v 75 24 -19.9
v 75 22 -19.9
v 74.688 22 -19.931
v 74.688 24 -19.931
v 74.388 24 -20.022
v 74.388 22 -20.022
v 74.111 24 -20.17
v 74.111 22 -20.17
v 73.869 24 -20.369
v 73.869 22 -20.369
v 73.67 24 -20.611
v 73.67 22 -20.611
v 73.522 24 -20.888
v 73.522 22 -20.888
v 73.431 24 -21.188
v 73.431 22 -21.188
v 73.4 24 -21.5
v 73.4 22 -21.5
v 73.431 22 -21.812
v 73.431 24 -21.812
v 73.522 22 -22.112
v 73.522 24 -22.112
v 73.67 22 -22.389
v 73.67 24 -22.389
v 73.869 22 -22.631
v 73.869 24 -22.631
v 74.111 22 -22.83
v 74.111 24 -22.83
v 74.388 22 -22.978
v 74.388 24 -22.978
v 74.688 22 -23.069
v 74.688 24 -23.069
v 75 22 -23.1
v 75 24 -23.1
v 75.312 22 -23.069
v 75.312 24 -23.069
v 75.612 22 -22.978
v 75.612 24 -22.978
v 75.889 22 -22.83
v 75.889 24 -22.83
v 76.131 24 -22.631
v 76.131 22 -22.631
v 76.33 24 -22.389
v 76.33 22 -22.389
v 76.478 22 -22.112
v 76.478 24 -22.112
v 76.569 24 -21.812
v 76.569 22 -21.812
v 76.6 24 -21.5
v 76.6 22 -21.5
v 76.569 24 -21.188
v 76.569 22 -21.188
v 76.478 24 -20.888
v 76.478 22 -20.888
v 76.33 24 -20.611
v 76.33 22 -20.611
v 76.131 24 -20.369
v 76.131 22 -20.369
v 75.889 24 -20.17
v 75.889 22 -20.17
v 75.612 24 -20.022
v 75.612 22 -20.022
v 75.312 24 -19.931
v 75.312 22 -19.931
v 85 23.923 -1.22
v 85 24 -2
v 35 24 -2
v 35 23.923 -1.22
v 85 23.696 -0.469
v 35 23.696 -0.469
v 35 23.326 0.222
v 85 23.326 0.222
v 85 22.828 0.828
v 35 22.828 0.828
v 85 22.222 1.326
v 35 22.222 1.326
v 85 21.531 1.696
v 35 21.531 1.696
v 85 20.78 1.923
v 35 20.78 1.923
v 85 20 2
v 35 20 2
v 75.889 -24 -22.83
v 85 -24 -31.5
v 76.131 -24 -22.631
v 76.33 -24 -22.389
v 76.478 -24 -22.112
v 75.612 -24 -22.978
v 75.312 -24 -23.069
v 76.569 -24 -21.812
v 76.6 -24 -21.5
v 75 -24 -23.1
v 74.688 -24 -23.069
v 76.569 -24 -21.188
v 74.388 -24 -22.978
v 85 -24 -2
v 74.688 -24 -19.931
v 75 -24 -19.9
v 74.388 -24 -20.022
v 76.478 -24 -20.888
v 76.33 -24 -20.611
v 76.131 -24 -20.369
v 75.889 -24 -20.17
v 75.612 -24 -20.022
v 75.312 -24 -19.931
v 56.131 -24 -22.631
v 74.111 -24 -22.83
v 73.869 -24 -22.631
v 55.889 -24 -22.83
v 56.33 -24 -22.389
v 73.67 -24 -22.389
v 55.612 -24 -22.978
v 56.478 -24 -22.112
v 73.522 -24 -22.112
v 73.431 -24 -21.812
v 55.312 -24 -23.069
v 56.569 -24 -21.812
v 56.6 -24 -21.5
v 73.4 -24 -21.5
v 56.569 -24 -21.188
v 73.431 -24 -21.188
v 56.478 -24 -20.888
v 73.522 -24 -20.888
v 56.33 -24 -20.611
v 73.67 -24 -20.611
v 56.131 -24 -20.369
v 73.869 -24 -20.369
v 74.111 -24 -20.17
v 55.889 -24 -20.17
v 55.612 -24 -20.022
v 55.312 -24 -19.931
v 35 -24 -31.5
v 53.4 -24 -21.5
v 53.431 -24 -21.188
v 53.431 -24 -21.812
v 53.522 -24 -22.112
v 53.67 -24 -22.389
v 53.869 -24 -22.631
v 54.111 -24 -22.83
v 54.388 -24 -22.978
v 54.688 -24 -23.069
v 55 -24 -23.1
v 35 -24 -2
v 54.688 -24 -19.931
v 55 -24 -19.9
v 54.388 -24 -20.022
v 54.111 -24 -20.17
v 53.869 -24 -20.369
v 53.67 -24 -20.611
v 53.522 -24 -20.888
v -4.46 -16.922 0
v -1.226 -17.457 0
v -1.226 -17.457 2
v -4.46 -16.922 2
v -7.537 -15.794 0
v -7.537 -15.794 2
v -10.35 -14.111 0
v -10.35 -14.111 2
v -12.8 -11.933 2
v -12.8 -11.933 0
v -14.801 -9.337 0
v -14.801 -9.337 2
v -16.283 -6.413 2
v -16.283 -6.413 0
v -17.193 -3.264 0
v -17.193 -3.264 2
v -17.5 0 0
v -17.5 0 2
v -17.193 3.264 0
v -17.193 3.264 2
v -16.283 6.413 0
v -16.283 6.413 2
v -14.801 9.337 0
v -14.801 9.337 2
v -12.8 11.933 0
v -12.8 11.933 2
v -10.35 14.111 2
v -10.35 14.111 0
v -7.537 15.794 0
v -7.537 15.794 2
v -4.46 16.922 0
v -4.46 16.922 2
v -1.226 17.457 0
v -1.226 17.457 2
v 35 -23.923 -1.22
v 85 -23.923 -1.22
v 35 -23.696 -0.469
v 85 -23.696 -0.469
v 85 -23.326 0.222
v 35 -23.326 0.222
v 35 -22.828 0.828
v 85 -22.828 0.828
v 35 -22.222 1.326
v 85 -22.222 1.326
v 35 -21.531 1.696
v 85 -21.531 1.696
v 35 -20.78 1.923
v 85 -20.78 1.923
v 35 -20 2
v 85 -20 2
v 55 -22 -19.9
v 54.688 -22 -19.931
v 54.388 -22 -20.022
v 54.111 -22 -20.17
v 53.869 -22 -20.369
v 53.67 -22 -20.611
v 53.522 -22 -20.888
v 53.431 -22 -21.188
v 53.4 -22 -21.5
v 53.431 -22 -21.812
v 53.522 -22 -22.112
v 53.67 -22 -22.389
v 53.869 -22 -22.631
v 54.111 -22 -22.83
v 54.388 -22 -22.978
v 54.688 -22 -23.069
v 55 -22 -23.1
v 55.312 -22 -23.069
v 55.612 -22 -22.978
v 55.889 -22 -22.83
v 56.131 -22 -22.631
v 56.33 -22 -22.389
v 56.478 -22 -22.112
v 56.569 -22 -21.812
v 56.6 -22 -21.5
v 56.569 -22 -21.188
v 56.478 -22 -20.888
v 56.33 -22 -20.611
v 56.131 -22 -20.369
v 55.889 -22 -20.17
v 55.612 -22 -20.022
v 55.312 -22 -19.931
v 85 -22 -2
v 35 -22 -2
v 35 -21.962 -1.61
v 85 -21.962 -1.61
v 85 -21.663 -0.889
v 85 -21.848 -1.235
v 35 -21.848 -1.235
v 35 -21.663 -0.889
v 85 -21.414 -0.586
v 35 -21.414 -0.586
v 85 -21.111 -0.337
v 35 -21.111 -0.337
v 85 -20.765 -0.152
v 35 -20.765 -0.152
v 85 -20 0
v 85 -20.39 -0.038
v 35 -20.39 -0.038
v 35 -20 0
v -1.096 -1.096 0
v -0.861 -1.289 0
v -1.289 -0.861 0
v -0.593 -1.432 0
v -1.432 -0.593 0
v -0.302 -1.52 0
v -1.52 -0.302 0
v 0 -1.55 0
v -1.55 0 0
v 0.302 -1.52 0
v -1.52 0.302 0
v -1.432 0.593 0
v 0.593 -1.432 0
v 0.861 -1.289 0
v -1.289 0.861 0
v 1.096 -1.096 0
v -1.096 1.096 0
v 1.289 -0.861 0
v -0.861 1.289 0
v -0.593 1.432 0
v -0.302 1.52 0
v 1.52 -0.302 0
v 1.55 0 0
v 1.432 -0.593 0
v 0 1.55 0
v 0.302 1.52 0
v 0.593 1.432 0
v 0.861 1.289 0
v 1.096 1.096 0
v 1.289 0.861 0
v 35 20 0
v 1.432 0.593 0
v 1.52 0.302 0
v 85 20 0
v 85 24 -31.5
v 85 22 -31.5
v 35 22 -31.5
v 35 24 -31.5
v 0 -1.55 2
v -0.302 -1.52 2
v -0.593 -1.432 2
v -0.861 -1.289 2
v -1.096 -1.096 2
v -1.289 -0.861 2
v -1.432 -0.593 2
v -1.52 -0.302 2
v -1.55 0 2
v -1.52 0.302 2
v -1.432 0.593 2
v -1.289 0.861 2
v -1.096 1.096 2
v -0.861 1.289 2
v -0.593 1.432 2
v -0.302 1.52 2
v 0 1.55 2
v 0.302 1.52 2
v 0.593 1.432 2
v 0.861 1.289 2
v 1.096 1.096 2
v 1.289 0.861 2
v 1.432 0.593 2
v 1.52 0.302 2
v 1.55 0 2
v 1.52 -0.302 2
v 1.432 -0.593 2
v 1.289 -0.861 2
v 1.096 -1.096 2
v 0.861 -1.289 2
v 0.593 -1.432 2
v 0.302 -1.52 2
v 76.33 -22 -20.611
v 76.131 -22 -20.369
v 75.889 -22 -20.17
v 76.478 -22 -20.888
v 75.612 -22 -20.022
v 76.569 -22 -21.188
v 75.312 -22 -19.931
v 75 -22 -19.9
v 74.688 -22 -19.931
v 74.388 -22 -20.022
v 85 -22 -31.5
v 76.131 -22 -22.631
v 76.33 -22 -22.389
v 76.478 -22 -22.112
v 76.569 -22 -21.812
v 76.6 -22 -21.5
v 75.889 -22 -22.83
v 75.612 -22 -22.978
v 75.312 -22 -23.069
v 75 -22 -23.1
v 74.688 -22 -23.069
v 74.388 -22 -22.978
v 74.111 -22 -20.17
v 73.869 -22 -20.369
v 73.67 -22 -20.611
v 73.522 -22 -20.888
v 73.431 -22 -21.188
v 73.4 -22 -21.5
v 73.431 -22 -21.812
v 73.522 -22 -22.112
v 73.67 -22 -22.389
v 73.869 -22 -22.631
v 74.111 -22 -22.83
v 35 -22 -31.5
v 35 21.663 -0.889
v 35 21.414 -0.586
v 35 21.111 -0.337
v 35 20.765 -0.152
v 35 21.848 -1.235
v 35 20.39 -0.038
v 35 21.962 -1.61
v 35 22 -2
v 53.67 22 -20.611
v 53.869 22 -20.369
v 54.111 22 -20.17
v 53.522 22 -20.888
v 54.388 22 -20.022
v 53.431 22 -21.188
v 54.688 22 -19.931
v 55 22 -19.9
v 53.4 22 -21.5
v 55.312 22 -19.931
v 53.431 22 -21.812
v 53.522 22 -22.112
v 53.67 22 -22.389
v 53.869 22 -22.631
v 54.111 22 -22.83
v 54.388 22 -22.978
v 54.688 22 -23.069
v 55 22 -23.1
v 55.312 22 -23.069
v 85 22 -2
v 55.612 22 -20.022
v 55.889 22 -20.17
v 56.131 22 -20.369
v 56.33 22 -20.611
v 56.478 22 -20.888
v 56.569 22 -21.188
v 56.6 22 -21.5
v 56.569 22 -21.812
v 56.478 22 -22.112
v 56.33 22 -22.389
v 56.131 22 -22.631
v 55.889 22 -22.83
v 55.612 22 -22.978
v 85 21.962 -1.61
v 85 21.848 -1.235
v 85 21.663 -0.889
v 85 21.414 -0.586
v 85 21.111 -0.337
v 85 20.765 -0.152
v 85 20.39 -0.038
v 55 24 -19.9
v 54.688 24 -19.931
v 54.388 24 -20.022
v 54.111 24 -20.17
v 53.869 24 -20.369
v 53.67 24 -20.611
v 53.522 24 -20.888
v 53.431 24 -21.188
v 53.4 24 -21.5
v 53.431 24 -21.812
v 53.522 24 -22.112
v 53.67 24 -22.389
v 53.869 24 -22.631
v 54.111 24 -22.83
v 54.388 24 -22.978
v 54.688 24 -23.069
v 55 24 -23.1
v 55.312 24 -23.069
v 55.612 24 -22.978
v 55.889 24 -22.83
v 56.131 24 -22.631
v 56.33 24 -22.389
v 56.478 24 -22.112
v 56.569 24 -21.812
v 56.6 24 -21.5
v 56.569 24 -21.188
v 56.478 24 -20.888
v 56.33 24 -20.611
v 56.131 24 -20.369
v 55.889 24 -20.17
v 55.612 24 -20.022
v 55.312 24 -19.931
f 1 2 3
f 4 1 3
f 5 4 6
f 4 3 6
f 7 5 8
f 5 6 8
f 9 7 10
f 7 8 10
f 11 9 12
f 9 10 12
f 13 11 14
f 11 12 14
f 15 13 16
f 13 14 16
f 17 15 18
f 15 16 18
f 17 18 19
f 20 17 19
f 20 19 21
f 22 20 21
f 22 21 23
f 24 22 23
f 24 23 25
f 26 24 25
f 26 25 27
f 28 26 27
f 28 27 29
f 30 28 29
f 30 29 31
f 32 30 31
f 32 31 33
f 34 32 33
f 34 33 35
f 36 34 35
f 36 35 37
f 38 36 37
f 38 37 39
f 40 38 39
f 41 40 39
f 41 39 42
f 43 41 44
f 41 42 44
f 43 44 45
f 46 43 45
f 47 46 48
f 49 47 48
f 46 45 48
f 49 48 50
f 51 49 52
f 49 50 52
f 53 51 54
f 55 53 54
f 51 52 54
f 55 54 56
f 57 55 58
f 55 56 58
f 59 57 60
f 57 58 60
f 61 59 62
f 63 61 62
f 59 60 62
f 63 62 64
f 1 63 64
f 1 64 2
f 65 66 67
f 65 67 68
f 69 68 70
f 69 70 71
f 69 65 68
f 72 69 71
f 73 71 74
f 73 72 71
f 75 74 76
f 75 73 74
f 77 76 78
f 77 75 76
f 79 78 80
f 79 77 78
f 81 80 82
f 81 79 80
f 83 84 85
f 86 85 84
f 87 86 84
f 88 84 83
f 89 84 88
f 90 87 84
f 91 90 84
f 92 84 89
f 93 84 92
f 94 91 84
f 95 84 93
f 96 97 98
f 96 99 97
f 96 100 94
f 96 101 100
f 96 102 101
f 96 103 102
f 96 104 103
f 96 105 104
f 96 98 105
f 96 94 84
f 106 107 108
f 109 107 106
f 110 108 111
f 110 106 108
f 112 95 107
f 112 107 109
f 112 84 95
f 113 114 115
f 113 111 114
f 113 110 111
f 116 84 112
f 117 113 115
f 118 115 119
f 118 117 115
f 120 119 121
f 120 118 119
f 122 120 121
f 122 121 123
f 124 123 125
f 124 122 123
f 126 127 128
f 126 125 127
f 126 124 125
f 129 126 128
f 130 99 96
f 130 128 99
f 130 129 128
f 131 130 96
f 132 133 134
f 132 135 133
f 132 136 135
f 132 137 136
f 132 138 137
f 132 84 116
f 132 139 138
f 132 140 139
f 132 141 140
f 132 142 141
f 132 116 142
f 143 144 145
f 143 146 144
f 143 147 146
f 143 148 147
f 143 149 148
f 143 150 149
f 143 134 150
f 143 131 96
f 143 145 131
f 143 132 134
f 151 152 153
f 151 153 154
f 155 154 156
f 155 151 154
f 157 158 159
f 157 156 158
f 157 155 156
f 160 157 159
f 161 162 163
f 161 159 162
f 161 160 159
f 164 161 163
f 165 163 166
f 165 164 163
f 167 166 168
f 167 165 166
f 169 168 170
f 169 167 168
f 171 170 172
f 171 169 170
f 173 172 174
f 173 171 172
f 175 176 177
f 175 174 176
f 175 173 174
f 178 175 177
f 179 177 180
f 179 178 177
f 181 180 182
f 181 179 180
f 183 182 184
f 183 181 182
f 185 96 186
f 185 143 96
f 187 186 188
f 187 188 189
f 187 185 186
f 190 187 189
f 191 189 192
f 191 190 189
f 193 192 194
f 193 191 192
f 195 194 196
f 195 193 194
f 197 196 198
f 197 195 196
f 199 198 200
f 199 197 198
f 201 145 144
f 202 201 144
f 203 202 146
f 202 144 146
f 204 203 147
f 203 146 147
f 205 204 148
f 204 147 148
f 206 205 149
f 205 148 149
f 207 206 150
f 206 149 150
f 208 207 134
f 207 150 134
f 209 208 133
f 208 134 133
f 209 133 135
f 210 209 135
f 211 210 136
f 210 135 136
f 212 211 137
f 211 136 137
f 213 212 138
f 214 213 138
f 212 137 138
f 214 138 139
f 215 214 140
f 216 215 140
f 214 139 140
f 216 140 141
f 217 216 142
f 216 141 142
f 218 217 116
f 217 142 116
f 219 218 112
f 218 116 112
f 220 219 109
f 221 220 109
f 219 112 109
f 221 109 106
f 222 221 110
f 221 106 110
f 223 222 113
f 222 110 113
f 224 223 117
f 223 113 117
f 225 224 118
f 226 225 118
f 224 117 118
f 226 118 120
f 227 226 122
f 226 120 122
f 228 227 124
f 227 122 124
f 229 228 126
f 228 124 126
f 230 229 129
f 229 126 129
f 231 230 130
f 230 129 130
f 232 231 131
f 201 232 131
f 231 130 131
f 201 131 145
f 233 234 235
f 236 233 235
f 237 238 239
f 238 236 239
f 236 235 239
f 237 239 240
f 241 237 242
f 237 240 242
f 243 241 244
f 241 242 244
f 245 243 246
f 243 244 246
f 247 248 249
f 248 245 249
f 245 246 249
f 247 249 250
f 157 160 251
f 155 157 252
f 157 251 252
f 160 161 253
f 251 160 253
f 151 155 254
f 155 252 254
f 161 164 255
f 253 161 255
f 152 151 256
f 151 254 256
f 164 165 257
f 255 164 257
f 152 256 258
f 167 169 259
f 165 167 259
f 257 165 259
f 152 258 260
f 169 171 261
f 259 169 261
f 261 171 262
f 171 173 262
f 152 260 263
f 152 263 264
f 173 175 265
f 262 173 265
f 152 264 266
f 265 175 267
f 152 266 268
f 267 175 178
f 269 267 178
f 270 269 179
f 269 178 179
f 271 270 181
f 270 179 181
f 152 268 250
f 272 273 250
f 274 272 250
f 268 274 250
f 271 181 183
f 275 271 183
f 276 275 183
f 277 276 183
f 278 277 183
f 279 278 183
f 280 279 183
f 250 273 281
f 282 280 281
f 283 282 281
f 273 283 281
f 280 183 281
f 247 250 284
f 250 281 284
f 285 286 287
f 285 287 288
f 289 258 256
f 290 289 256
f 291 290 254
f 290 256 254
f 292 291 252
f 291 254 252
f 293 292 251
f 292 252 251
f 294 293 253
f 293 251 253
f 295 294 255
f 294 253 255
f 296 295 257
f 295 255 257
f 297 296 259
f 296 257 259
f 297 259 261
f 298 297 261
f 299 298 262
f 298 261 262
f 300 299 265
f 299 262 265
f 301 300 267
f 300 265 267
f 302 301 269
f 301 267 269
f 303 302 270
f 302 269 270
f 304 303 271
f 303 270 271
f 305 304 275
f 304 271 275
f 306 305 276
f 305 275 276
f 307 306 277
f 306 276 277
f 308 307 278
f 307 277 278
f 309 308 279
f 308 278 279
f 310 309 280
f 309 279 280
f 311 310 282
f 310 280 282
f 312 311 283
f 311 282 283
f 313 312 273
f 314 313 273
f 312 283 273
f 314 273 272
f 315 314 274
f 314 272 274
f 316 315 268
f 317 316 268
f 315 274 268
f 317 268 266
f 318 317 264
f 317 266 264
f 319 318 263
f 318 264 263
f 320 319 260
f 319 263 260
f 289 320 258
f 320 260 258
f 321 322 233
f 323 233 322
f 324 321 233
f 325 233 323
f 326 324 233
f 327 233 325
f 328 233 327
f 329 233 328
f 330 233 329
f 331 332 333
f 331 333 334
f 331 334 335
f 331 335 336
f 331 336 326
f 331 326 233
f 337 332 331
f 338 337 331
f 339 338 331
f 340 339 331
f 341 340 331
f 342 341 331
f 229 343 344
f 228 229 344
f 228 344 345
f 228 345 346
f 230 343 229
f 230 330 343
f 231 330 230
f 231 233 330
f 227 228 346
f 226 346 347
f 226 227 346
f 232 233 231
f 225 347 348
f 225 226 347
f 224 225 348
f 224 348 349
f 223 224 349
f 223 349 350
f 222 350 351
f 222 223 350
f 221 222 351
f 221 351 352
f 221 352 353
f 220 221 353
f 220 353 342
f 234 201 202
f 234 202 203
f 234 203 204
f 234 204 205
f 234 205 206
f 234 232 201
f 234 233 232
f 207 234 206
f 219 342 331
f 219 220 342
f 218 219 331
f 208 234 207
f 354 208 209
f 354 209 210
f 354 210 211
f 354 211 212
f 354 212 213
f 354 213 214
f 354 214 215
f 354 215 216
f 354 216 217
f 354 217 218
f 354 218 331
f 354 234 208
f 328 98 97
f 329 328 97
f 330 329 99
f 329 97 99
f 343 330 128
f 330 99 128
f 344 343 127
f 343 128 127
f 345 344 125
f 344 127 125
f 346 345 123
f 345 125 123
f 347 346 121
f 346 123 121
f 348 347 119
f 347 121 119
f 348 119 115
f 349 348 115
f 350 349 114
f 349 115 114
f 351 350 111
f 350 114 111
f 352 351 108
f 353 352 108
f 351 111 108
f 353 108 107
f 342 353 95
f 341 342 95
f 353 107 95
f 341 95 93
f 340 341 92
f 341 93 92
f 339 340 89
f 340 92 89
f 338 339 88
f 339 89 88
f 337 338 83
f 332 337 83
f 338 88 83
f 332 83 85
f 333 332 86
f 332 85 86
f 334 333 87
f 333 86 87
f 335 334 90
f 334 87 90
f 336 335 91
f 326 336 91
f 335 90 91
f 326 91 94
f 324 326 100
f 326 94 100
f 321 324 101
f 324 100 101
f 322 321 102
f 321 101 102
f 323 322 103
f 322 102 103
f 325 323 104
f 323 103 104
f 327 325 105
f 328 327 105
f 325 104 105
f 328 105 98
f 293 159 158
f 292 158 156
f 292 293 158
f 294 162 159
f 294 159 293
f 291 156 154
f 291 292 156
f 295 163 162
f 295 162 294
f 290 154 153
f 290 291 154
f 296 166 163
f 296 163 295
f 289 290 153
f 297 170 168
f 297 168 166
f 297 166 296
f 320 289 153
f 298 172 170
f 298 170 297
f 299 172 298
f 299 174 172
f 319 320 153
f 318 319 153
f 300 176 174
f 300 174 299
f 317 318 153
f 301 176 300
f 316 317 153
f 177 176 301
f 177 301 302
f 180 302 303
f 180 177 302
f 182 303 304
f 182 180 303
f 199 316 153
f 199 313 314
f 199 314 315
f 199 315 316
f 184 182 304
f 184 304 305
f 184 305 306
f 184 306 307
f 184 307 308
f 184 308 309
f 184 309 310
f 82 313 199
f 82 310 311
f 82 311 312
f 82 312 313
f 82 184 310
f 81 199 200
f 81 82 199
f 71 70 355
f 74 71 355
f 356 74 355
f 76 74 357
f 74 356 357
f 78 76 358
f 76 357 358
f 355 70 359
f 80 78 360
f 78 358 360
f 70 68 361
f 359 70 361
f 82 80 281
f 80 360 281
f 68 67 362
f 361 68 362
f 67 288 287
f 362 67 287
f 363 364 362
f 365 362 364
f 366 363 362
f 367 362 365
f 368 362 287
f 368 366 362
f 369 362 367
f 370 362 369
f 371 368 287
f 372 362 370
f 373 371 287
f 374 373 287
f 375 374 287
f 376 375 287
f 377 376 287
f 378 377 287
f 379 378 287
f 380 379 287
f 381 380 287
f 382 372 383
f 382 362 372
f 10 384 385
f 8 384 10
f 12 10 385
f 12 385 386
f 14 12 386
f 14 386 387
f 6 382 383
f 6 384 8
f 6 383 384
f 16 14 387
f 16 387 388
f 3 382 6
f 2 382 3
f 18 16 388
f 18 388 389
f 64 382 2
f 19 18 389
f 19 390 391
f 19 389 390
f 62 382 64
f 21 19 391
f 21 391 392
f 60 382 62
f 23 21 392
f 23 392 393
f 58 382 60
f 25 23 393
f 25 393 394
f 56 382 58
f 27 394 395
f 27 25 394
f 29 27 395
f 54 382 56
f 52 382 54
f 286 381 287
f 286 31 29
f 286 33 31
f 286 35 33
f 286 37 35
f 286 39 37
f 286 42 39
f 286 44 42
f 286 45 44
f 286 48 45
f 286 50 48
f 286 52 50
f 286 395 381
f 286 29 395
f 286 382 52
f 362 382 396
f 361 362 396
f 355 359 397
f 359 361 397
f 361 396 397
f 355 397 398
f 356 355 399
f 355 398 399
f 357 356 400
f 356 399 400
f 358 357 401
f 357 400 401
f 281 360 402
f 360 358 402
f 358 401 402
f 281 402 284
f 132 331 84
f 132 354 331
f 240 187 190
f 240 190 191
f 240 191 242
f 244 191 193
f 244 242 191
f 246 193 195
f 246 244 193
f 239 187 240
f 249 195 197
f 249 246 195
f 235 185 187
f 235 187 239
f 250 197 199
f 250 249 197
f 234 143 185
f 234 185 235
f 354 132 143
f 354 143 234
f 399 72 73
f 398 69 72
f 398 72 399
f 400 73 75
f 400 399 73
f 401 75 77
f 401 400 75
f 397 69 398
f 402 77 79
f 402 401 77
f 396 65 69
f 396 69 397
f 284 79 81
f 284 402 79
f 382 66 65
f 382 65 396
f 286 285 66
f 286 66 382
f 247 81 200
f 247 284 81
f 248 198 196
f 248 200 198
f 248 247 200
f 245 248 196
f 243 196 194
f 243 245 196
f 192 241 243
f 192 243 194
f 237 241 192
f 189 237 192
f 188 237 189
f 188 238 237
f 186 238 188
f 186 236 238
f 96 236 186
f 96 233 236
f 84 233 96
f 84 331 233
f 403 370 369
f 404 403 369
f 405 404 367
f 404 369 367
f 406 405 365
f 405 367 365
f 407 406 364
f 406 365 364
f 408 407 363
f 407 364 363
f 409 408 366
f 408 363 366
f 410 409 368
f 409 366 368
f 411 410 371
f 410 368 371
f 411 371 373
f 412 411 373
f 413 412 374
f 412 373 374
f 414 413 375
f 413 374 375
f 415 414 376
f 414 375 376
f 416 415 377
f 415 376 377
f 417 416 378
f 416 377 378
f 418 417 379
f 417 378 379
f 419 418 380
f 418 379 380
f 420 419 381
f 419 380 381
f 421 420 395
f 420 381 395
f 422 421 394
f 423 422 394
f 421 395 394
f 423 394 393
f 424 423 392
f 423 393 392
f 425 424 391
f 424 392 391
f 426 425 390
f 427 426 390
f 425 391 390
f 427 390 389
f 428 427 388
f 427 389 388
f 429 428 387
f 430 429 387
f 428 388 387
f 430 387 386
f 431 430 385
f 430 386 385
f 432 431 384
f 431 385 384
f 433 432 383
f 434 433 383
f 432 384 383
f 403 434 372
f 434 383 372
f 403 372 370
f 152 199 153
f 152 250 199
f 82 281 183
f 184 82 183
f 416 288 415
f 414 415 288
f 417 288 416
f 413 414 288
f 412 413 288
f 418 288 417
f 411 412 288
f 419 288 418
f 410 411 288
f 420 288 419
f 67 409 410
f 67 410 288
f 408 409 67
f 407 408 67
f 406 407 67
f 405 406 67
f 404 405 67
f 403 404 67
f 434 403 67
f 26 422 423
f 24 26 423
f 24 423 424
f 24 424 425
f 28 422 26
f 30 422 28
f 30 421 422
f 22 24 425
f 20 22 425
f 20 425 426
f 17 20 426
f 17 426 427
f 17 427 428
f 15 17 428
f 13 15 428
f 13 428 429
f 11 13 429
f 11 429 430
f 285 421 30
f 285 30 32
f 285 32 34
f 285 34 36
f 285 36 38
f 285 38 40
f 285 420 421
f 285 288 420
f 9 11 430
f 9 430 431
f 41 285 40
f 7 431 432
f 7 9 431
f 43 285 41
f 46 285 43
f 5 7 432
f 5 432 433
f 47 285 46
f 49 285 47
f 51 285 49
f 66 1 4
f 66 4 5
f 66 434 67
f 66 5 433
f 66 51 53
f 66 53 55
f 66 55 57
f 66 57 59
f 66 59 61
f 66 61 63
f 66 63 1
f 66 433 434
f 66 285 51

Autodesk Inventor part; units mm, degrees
ref_plane "YZ Plane" through (0, 0, 0) normal (1, 0, 0) x (0, 1, 0)
ref_plane "XZ Plane" through (0, 0, 0) normal (0, 1, 0) x (-1, 0, 0)
ref_plane "XY Plane" through (0, 0, 0) normal (0, 0, 1) x (1, 0, 0)
sketch "スケッチ1" plane through (0, 0, 0) normal (0, 0, 1) x (1, 0, 0)
  circle A0 centre (0, 0) radius 17.5
  line L0 (0, 0) -> (35, 0)
  line L1 (35, 0) -> (35, 20)
  line L2 (35, 20) -> (-1.2255, 17.457)
  line L3 (35, 20) -> (85, 20)
  line L4 (85, 20) -> (85, 0)
  line L5 (85, 0) -> (35, 0)
  line L6 (35, 0) -> (35, 20)
  line L7 (35, 0) -> (35, -20)
  line L8 (35, -20) -> (-1.2255, -17.457)
  line L9 (35, -20) -> (85, -20)
  line L10 (85, -20) -> (85, 0)
  point P0 (-1.2255, -17.457)
  dimension "d0" = 35
  dimension "d1" = 35
  dimension "d2" = 20
  dimension "d3" = 20
  dimension "d4" = 50
extrude "プレート1" add sketch "スケッチ1" along normal blind 2
sketch "スケッチ2" plane through (85, 22, -2) normal (0, 1, 0) x (-1, 0, 0)
  line L0 (50, 0) -> (0, 0)
  line L1 (0, 0) -> (0, -29.5)
  line L2 (0, -29.5) -> (50, -29.5)
  line L3 (50, -29.5) -> (50, 0)
edge flange "フランジ1" height 33.5 angle 90 thickness 2 bend radius 2 thickness toward (0, 1, 0) relief tear relief width 2 relief depth 1 corner gap 2 corner form 0 edges at (60, 20, 0) (60, -20, 0) wall of the first edge with corners at (35, 22, -2) (85, 22, -2) (85, 22, -31.5) (35, 22, -31.5)
bend "曲げ1"
corner "コーナー1"
sketch "スケッチ3" plane through (0, 0, 2) normal (0, 0, 1) x (1, 0, 0)
  circle A0 centre (0, 0) radius 12
  point P0 (0, 12)
  point P1 (-10.3923, 6)
  point P2 (-10.3923, -6)
  point P3 (0, -12)
  point P4 (10.3923, -6)
  point P5 (10.3923, 6)
  dimension "d16" = 24
  dimension "d19" = 360
hole "穴1" [suppressed]
sketch "スケッチ4" plane through (0, 0, 2) normal (0, 0, 1) x (1, 0, 0)
  arc A0 (-1.2255, 17.457) -> (-1.2255, -17.457) centre (0, 0) ccw projected
  circle A1 centre (0, 0) radius 6.25
  dimension "d28" = 12.5
extrude "押し出し1" [suppressed]
sketch "スケッチ5" plane through (35, 24, -31.5) normal (0, 1, 0) x (1, 0, 0)
  line L0 (0, 0) -> (0, -29.5) projected
  line L1 (0, -10) -> (50, -10)
  line L2 (50, -29.5) -> (50, 0) projected
  line L3 (50, 0) -> (0, 0) projected
  line L4 (10, 0) -> (10, -29.5)
  line L5 (0, -29.5) -> (50, -29.5) projected
  point P0 (-35, -31.5)
  point P1 (20, -10)
  point P2 (40, -10)
  dimension "d31" = 10
  dimension "d32" = 10
  dimension "d33" = 10
  dimension "d34" = 20
hole "穴2" at (55, 24, -21.5) at (75, 24, -21.5) direction (0, -1, 0) diameter 3.2 end through all
sketch "スケッチ6" plane through (0, 0, 2) normal (0, 0, 1) x (1, 0, 0)
  point P0 (0, 0)
  point P1 (0, 0)
hole "穴3" at (0, 0, 2) direction (0, 0, -1) diameter 3.1 end through all
equation "\"d26\" = Thickness"
equation "\"d47\" = Thickness"
equation "\"d5\" = Thickness"
equation "\"d6\" = BendReliefWidth"
equation "\"d7\" = BendReliefDepth"
equation "\"d8\" = MinimumRemnant"
equation "\"d9\" = TransitionRadius"
equation "\"d12\" = BendRadius"
equation "\"d13\" = CornerReliefSize"
equation "\"d14\" = GapSize"
equation "\"d15\" = JacobiRadiusSize"
equation "\"BendRadius\" = Thickness"
equation "\"BendReliefWidth\" = Thickness"
equation "\"BendReliefDepth\" = 0.5 * Thickness"
equation "\"CornerReliefSize\" = 4 * Thickness"
equation "\"MinimumRemnant\" = 2 * Thickness"
equation "\"TransitionRadius\" = BendRadius"
equation "\"JacobiRadiusSize\" = BendRadius"
equation "\"GapSize\" = Thickness"
equation "\"Thickness\" = 2"
properties part number "servoplate2_forR0" material "アルミニウム 6061"
